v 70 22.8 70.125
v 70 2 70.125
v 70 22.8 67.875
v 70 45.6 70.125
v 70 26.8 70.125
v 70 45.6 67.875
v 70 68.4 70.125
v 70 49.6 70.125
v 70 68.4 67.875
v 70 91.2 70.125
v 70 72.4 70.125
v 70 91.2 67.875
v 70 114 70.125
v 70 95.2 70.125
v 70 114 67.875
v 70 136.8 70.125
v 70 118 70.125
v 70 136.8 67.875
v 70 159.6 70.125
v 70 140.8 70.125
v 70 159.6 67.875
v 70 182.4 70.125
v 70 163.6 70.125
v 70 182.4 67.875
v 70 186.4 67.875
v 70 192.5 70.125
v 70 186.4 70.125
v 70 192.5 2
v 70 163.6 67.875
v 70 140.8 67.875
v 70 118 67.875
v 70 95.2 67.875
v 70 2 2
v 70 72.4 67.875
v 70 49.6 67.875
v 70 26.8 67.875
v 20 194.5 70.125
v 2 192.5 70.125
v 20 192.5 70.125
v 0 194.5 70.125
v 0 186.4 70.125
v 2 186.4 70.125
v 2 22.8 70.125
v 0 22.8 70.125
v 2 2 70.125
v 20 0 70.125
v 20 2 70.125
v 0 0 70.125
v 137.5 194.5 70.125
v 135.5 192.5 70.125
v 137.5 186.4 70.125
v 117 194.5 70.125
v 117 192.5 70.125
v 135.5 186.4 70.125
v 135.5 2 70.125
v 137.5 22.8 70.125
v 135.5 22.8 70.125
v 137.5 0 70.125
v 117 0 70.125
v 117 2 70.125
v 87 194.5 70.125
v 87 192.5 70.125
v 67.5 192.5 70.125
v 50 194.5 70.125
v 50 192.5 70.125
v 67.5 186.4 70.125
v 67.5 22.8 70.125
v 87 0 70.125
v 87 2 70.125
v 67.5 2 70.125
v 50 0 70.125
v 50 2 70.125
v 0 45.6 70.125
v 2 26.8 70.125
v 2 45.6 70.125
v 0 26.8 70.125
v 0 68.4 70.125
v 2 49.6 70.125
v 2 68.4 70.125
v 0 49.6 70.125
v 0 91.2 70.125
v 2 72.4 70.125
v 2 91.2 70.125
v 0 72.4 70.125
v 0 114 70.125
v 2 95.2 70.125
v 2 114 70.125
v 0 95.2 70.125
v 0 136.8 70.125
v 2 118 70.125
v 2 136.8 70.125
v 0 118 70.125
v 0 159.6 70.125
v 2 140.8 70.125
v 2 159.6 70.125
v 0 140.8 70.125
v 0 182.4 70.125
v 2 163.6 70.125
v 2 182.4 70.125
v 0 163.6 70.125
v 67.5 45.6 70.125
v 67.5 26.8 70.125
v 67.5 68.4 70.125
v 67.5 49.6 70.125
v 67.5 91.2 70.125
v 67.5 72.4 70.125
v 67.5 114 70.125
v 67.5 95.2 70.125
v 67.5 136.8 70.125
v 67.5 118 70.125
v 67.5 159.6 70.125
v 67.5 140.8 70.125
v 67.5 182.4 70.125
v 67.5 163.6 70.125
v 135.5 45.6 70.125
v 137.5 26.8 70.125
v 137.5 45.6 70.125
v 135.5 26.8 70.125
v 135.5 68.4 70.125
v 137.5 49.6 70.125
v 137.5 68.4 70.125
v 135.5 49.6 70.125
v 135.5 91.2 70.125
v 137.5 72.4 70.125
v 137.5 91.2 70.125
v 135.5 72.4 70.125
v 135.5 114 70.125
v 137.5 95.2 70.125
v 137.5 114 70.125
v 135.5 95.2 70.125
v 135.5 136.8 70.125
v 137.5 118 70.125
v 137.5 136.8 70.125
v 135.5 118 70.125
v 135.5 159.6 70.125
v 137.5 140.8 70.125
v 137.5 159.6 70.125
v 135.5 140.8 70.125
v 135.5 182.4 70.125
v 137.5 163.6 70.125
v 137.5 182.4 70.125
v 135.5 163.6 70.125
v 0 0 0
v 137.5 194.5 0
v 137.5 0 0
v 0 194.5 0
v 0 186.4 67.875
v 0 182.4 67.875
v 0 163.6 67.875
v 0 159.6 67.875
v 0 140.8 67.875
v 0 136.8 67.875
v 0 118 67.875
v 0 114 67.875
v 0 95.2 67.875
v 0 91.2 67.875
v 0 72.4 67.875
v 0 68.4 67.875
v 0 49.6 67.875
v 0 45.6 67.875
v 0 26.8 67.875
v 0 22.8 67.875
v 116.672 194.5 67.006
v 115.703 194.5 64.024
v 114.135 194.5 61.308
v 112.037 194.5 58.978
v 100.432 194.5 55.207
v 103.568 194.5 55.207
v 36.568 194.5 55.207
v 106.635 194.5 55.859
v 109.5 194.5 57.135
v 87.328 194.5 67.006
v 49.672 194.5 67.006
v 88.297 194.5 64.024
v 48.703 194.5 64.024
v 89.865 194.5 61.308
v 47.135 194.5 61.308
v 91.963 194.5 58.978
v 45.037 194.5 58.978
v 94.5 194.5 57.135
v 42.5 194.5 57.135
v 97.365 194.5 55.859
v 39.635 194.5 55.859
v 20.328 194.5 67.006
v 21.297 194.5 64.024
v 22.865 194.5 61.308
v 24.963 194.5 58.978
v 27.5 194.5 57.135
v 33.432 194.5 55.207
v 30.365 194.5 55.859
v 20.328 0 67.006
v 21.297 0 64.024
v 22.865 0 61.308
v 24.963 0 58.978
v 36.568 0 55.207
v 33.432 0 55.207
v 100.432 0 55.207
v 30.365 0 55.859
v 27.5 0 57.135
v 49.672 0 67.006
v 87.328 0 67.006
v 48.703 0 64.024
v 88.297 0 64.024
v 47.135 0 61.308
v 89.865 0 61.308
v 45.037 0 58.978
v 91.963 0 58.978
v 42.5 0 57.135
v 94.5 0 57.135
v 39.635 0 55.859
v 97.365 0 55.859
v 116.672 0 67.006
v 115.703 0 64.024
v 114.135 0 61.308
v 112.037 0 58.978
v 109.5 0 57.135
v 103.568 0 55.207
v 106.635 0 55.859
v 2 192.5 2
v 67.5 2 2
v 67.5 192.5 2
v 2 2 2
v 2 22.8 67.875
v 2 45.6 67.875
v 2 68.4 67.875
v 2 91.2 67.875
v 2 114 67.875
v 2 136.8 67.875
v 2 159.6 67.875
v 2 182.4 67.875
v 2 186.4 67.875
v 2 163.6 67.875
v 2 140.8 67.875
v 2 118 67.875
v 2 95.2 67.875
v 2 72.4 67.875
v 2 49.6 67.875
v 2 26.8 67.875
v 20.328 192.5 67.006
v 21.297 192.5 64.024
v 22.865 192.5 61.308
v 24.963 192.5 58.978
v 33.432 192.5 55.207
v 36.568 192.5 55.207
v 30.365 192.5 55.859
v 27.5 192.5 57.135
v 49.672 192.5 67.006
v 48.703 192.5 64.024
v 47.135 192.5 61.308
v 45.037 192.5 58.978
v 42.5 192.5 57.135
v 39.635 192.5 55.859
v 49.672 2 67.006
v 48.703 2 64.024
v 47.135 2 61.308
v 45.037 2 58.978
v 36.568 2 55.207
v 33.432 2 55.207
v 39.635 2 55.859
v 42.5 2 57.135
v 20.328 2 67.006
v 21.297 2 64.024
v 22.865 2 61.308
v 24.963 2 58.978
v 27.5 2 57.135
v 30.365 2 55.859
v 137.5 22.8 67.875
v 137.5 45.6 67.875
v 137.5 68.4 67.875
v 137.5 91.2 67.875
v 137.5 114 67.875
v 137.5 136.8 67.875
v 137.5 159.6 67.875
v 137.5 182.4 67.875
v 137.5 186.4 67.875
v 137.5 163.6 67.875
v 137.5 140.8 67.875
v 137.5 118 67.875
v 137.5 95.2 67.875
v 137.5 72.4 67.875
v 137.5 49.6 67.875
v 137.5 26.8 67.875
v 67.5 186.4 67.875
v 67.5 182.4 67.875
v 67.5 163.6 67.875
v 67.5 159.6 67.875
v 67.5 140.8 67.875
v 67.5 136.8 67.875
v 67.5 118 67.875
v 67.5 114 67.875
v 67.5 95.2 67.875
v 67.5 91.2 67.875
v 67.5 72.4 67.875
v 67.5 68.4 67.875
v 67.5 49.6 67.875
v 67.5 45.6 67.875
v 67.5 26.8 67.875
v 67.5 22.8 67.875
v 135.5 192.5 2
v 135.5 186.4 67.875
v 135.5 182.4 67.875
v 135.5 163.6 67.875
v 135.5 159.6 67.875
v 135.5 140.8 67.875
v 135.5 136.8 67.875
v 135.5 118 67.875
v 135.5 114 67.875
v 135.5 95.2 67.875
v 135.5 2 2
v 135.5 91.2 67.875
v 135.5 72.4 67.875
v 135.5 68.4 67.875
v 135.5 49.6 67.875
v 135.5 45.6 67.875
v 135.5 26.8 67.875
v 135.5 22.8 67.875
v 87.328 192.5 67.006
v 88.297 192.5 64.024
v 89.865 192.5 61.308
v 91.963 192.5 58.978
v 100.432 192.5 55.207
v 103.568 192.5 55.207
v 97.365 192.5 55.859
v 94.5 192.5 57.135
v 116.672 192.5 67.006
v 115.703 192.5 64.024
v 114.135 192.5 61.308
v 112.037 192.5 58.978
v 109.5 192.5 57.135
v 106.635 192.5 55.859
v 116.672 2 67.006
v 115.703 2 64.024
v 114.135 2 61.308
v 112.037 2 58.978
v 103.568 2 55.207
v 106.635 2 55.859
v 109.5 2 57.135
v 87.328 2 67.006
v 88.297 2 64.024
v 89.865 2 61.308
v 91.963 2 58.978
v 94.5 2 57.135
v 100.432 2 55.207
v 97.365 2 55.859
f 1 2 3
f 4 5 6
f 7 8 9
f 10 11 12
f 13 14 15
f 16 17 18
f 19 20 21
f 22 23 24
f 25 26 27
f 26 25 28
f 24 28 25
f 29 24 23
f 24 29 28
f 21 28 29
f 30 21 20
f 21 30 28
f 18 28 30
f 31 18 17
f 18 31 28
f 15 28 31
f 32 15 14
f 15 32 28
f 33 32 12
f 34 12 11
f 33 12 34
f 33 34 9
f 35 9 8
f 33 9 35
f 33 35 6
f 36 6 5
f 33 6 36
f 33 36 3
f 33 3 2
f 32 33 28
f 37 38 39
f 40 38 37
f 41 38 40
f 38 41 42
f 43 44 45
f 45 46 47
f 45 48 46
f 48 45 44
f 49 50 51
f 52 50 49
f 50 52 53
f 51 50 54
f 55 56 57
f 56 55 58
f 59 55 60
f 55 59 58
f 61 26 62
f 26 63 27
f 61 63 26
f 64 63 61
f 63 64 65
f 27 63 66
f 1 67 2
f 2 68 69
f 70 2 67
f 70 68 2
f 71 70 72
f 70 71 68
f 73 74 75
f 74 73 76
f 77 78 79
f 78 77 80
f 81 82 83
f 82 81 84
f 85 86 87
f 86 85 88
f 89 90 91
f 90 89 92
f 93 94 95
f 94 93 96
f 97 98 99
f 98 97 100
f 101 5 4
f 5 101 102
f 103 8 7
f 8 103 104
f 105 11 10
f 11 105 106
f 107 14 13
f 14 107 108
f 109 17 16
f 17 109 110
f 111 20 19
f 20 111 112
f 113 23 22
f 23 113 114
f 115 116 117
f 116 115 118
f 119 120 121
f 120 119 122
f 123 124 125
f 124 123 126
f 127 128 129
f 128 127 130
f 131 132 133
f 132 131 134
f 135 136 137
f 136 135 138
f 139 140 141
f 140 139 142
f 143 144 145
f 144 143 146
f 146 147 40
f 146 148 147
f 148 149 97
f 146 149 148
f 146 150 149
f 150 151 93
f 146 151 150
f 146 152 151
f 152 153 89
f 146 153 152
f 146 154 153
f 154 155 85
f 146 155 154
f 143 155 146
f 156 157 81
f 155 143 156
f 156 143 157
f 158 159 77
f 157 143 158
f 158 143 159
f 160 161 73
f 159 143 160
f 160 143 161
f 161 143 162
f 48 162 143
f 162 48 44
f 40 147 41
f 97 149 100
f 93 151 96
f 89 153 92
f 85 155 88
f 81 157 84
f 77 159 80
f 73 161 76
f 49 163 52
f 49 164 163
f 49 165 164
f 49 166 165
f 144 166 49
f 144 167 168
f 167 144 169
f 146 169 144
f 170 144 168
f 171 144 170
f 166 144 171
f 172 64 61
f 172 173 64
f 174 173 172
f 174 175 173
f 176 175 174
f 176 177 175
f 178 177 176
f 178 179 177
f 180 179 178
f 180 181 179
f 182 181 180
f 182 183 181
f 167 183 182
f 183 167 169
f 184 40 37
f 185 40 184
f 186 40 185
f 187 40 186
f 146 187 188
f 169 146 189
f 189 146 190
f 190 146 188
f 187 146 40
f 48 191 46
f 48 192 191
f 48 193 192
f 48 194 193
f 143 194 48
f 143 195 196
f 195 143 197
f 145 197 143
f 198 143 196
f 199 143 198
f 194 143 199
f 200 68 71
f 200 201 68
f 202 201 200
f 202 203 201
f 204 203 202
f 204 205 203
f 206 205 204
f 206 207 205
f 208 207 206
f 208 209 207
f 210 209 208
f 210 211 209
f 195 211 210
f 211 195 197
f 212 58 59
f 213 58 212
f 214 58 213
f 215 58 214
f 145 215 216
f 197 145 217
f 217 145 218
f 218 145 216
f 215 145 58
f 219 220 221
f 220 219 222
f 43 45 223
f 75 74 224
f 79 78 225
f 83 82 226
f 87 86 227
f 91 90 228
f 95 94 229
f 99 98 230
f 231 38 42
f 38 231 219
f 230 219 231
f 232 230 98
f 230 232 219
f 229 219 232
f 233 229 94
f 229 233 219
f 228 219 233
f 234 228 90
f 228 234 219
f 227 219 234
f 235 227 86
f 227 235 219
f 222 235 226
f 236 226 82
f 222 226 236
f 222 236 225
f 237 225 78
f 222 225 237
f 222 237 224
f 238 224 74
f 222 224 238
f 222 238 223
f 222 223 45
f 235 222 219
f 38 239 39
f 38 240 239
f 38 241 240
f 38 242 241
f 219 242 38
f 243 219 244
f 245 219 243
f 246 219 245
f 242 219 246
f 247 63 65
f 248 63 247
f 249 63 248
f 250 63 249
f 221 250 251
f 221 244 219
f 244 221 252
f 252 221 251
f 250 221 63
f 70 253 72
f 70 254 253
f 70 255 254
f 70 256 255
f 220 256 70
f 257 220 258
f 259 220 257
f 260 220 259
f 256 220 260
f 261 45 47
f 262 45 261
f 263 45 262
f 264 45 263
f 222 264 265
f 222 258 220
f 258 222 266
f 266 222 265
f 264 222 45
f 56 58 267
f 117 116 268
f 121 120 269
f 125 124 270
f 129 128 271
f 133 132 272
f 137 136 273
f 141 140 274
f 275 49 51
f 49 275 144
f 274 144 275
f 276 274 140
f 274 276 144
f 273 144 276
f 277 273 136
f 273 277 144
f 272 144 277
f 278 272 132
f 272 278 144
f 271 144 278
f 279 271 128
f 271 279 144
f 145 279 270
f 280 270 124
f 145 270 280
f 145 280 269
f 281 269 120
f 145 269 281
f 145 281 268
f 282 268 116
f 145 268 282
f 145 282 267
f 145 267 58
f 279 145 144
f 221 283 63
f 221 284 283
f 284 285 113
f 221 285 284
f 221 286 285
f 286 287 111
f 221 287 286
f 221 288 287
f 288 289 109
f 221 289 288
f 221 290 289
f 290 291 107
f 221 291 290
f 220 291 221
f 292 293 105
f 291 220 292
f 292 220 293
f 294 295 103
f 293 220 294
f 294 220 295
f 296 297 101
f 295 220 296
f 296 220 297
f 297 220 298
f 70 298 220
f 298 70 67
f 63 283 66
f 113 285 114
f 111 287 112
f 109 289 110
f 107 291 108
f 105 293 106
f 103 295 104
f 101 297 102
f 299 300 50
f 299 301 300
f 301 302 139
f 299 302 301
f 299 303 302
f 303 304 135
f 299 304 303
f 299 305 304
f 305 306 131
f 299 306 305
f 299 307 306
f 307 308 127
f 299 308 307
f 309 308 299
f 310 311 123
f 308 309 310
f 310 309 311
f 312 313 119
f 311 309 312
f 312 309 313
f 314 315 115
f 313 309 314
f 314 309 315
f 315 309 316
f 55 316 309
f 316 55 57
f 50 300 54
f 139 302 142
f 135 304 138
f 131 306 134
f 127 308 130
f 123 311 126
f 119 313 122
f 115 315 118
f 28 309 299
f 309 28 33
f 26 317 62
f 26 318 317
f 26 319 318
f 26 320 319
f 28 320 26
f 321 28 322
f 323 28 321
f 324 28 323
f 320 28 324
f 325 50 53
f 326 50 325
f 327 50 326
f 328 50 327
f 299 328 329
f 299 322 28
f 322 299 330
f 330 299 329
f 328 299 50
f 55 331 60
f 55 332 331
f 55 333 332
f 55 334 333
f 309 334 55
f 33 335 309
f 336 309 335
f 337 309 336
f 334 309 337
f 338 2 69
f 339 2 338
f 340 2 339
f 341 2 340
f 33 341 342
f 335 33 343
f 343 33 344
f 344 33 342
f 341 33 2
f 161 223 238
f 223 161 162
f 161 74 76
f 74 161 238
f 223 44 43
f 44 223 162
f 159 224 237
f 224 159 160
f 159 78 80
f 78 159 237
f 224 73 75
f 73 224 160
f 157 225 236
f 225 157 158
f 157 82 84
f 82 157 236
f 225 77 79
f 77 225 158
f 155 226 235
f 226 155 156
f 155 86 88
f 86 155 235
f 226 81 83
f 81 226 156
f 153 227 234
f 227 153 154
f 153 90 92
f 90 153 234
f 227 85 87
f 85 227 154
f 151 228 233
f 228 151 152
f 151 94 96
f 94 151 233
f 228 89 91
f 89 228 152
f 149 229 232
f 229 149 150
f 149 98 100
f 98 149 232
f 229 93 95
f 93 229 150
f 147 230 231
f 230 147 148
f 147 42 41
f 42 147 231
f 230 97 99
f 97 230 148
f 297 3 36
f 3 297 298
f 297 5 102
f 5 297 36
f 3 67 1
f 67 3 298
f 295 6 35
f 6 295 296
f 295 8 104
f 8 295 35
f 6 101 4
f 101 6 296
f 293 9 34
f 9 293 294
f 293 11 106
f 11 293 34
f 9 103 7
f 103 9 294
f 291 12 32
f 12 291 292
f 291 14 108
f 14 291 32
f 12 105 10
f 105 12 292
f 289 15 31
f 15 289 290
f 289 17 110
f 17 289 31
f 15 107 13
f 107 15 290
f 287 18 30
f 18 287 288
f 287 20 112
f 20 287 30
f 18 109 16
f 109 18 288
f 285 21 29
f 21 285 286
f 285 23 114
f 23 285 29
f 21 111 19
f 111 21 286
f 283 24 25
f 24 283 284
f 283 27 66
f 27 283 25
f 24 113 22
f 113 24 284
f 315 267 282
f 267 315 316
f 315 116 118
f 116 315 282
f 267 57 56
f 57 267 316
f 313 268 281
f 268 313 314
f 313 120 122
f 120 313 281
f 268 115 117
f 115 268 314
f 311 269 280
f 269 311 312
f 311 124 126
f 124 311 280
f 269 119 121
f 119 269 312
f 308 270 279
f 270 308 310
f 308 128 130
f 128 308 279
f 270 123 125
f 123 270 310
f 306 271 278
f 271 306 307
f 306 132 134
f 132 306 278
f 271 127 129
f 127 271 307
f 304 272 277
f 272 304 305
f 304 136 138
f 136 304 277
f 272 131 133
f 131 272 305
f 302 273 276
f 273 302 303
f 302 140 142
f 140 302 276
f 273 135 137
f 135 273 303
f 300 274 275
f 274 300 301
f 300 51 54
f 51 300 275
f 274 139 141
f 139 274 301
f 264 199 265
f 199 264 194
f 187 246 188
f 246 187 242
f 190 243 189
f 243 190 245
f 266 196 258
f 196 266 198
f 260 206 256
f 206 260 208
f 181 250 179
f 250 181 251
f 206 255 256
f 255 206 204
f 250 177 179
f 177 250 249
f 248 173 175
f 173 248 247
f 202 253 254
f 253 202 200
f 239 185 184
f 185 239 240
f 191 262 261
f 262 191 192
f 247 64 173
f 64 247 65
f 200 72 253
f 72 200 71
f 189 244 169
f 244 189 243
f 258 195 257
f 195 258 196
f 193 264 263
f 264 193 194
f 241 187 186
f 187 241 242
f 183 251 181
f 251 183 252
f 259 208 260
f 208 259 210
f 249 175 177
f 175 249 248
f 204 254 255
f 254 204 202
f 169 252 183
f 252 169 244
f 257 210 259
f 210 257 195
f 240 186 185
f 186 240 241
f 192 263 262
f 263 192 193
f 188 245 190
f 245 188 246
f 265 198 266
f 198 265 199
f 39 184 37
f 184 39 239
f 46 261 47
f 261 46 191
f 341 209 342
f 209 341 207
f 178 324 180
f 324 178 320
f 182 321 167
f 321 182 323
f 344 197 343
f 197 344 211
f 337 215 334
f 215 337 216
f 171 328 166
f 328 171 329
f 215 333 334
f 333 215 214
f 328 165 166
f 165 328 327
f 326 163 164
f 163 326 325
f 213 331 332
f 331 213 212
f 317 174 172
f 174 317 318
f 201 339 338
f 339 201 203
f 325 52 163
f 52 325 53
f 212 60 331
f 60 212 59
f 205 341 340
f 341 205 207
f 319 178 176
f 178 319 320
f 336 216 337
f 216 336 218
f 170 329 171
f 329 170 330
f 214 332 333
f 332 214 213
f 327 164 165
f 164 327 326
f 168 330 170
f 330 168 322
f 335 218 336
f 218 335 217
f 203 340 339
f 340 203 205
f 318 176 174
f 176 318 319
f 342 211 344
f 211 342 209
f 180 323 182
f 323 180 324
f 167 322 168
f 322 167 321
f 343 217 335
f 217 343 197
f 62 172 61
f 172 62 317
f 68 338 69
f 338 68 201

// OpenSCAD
cardWidth=65.5;
cardHeight=90.5;
cardThickness=0.38;

boxHeight = cardHeight*0.75;

cardPerBox=500;
cardBlockLength=cardThickness*cardPerBox;

spaceAroundCard=0.25;
spaceAroundLid=0.5;

wallthickness=2;

fingerCutout=30;

// 1 for base box, 0 for lid, 2 for Logo only
boxOrLidOrLogo=1;

// logo filename
//logoFile=""; //No Logo


// logoFile="Pokemon_Card_Sets_Logos/pokemon-unbroken-bonds-set-symbol-150x150.dxf"; //Unbroken Bonds	2019
// logoFile="Pokemon_Card_Sets_Logos/detective-pikachu-set-symbol-150x147.dxf"; //Detective Pikachu	2019
// logoFile="Pokemon_Card_Sets_Logos/pokemon-team-up-set-symbol-150x150.dxf"; //Team Up	2019
// logoFile="Pokemon_Card_Sets_Logos/sm-lost-thunder-set-symbol-145x150.dxf"; //Lost Thunder	2018
// logoFile="Pokemon_Card_Sets_Logos/dragon-majesty-pokemon-set-symbol-150x150.dxf"; //Dragon Majesty	2018
// logoFile="Pokemon_Card_Sets_Logos/sun-and-moon-celestial-storm-pokemon-set-symbol-150x150.dxf"; //Celestial Storm	2018
// logoFile="Pokemon_Card_Sets_Logos/sun-and-moon-forbidden-light-pokemon-set-symbol-150x150.dxf"; //Forbidden Light	2018
// logoFile="Pokemon_Card_Sets_Logos/sun-and-moon-ultra-prism-pokemon-set-symbol-1-150x150.dxf"; //Ultra Prism	2018
// logoFile="Pokemon_Card_Sets_Logos/sun-and-moon-crimson-invasion-pokemon-set-symbol-150x150.dxf"; //Crimson Invasion	2017
// logoFile="Pokemon_Card_Sets_Logos/shining-legends-pokemon-set-symbol-150x150.dxf"; //Shining Legends	2017
// logoFile="Pokemon_Card_Sets_Logos/sun-and-moon-burning-shadows-set-symbol-150x150.dxf"; //Burning Shadows	2017
// logoFile="Pokemon_Card_Sets_Logos/sun-and-moon-guardians-rising-pokemon-set-symbol-150x150.dxf"; //Guardians Rising	2017
// logoFile="Pokemon_Card_Sets_Logos/sun-and-moon-pokemon-set-symbol-150x150.dxf"; //Sun & Moon	2017
// logoFile="Pokemon_Card_Sets_Logos/xy-promos-pokemon-set-symbol-150x136.dxf"; //Sun & Moon Promos	2016
// logoFile="Pokemon_Card_Sets_Logos/xy-evolutions-pokemon-set-symbol-150x150.dxf"; //Evolutions	2016
// logoFile="Pokemon_Card_Sets_Logos/xy-steam-siege-pokemon-set-symbol-150x150.dxf"; //Steam Siege	2016
// logoFile="Pokemon_Card_Sets_Logos/xy-fates-collide-pokemon-set-symbol-150x150.dxf"; //Fates Collide	2016
// logoFile="Pokemon_Card_Sets_Logos/generations-pokemon-set-symbol-150x150.dxf"; //Generations	2016
// logoFile="Pokemon_Card_Sets_Logos/xy-BREAKpoint-pokemon-set-symbol-150x150.dxf"; //BREAKpoint	2016
// logoFile="Pokemon_Card_Sets_Logos/xy-BREAKthrough-pokemon-set-symbol-150x150.dxf"; //BREAKthrough	2015
// logoFile="Pokemon_Card_Sets_Logos/xy-ancient-origins-pokemon-set-symbol-150x150.dxf"; //Ancient Origins	2015
// logoFile="Pokemon_Card_Sets_Logos/xy-roaring-skies-pokemon-set-symbol-150x150.dxf"; //Roaring Skies	2015
// logoFile="Pokemon_Card_Sets_Logos/xy-double-crisis-pokemon-set-symbol.png-150x150.dxf"; //Double Crisis	2015
// logoFile="Pokemon_Card_Sets_Logos/xy-primal-clash-pokemon-set-symbol-150x150.dxf"; //Primal Clash	2015
// logoFile="Pokemon_Card_Sets_Logos/xy-phantom-forces-pokemon-set-symbol-150x150.dxf"; //Phantom Forces	2014
// logoFile="Pokemon_Card_Sets_Logos/xy-furious-fists-pokemon-set-symbol-150x150.dxf"; //Furious Fists	2014
// logoFile="Pokemon_Card_Sets_Logos/xy-flashfire-pokemon-set-symbol-150x150.dxf"; //Flashfire	2014
// logoFile="Pokemon_Card_Sets_Logos/xy-pokemon-set-symbol-150x150.dxf"; //XY	2014
// logoFile="Pokemon_Card_Sets_Logos/xy-kalos-starter-pokemon-set-symbol-150x150.dxf"; //Kalos Starter Set	2013
// logoFile="Pokemon_Card_Sets_Logos/xy-promos-pokemon-set-symbol-150x136.dxf"; //XY - Promos	2013
// logoFile="Pokemon_Card_Sets_Logos/black-and-white-legendary-treasures-pokemon-set-symbol-150x150.dxf"; //Legendary Treasures	2013
// logoFile="Pokemon_Card_Sets_Logos/black-and-white-plasma-blast-pokemon-set-symbol-150x150.dxf"; //Plasma Blast	2013
// logoFile="Pokemon_Card_Sets_Logos/black-and-white-plasma-freeze-pokemon-set-symbol-150x150.dxf"; //Plasma Freeze	2013
// logoFile="Pokemon_Card_Sets_Logos/black-and-white-plasma-storm-pokemon-set-symbol-150x150.dxf"; //Plasma Storm	2013
// logoFile="Pokemon_Card_Sets_Logos/black-and-white-boundaries-crossed-pokemon-set-symbol-150x150.dxf"; //Boundaries Crossed	2012
// logoFile="Pokemon_Card_Sets_Logos/black-and-white-dragon-vault-pokemon-set-symbol-150x150.dxf"; //Dragon Vault	2012
// logoFile="Pokemon_Card_Sets_Logos/black-and-white-dragons-exalted-pokemon-set-symbol-150x150.dxf"; //Dragons Exalted	2012
// logoFile="Pokemon_Card_Sets_Logos/black-and-white-dark-explorers-pokemon-set-symbol-150x150.dxf"; //Dark Explorers	2012
// logoFile="Pokemon_Card_Sets_Logos/black-and-white-next-destinies-pokemon-set-symbol-150x150.dxf"; //Next Destinies	2012
// logoFile="Pokemon_Card_Sets_Logos/black-and-white-noble-victories-pokemon-set-symbol-150x150.dxf"; //Noble Victories	2011
// logoFile="Pokemon_Card_Sets_Logos/black-and-white-emerging-powers-pokemon-set-symbol-150x150.dxf"; //Emerging Powers	2011
// logoFile="Pokemon_Card_Sets_Logos/black-and-white-pokemon-set-symbol-150x150.dxf"; //Black and White Base Set	2011
// logoFile="Pokemon_Card_Sets_Logos/call-of-legends-pokemon-set-symbol-150x150.dxf"; //Call of Legends	2011
// logoFile="Pokemon_Card_Sets_Logos/heartgold-and-soulsilver-triumphant-pokemon-set-symbol-150x150.dxf"; //Triumphant	2010
// logoFile="Pokemon_Card_Sets_Logos/heartgold-and-soulsilver-undaunted-pokemon-set-symbol-150x150.dxf"; //Undaunted	2010
// logoFile="Pokemon_Card_Sets_Logos/heartgold-and-soulsilver-unleashed-pokemon-set-symbol-150x150.dxf"; //Unleashed	2010
// logoFile="Pokemon_Card_Sets_Logos/heartGold-and-soulSilver-pokemon-set-symbol-150x150.dxf"; //HeartGold and SoulSilver	2010
// logoFile="Pokemon_Card_Sets_Logos/heartgold-soulsilver-promos-pokemon-set-symbol-150x136.dxf"; //HeartGold and SoulSilver Promos	2010
// logoFile="Pokemon_Card_Sets_Logos/arceus-pokemon-set-symbol-150x150.dxf"; //Arceus	2009
// logoFile="Pokemon_Card_Sets_Logos/supreme-victors-pokemon-set-symbol-150x150.dxf"; //Supreme Victors	2009
// logoFile="Pokemon_Card_Sets_Logos/rising-rivals-pokemon-set-symbol-150x150.dxf"; //Rising Rivals	2009
// logoFile="Pokemon_Card_Sets_Logos/pokemon-pop-series-9-set-symbol-150x92.dxf"; //POP Series 9	2009
// logoFile="Pokemon_Card_Sets_Logos/platinum-base-set-pokemon-set-symbol-150x150.dxf"; //Platinum Base Set	2009
// logoFile="Pokemon_Card_Sets_Logos/pokemon-pop-series-8-set-symbol-150x91.dxf"; //POP Series 8	2008 - 2009
// logoFile="Pokemon_Card_Sets_Logos/stormfront-pokemon-set-symbol-150x150.dxf"; //Stormfront	2008
// logoFile="Pokemon_Card_Sets_Logos/legends-awakened-pokemon-set-symbol-150x150.dxf"; //Legends Awakened	2008
// logoFile="Pokemon_Card_Sets_Logos/majestic-dawn-pokemon-set-symbol-150x150.dxf"; //Majestic Dawn	2008
// logoFile="Pokemon_Card_Sets_Logos/pokemon-pop-series-7-set-symbol-150x95.dxf"; //POP Series 7	2008
// logoFile="Pokemon_Card_Sets_Logos/great-encounters-pokemon-set-symbol-150x150.dxf"; //Great Encounters	2008	
// logoFile="Pokemon_Card_Sets_Logos/secret-wonders-pokemon-set-symbol-150x150.dxf"; //Secret Wonders	2007
// logoFile="Pokemon_Card_Sets_Logos/pokemon-pop-series-6-set-symbol-150x91.dxf"; //POP Series 6	2007 - 2008
// logoFile="Pokemon_Card_Sets_Logos/mysterious-treasures-pokemon-set-symbol-150x150.dxf"; //Mysterious Treasures	2007
// logoFile="Pokemon_Card_Sets_Logos/diamond-and-pearl-pokemon-set-symbol-150x150.dxf"; //Diamond & Pearl	2007
// logoFile="Pokemon_Card_Sets_Logos/diamond-pearl-promos-pokemon-set-symbol-150x136.dxf"; //Diamond & Pearl Promos	2007
// logoFile="Pokemon_Card_Sets_Logos/pokemon-pop-series-5-set-symbol-150x97.dxf"; //POP Series 5	2007
// logoFile="Pokemon_Card_Sets_Logos/ex-power-keepers-pokemon-set-symbol-150x150.dxf"; //Power Keepers	2007
// logoFile="Pokemon_Card_Sets_Logos/ex-dragon-frontiers-pokemon-set-symbol-150x150.dxf"; //Dragon Frontiers	2006
// logoFile="Pokemon_Card_Sets_Logos/ex-crystal-guardians-pokemon-set-symbol-150x150.dxf"; //Crystal Guardians	2006
// logoFile="Pokemon_Card_Sets_Logos/pokemon-pop-series-4-set-symbol-150x92.dxf"; //POP Series 4	2006 - 2007
// logoFile="Pokemon_Card_Sets_Logos/ex-holon-phantoms-pokemon-set-symbol-150x150.dxf"; //Holon Phantoms	2006
// logoFile="Pokemon_Card_Sets_Logos/pokemon-pop-series-3-set-symbol-150x94.dxf"; //POP Series 3	2006
// logoFile="Pokemon_Card_Sets_Logos/ex-trainer-kit-2-minun-pokemon-set-symbol-115x150.dxf"; //EX Trainer Kit 2	2006
// logoFile="Pokemon_Card_Sets_Logos/ex-legend-maker-pokemon-set-symbol-150x150.dxf"; //Legend Maker	2006
// logoFile="Pokemon_Card_Sets_Logos/ex-delta-species-pokemon-set-symbol-150x150.dxf"; //Delta Species	2005
// logoFile="Pokemon_Card_Sets_Logos/ex-unseen-forces-pokemon-set-symbol-150x150.dxf"; //Unseen Forces	2005
// logoFile="Pokemon_Card_Sets_Logos/pokemon-pop-series-2-set-symbol-150x94.dxf"; //POP Series 2	2005 - 2006
// logoFile="Pokemon_Card_Sets_Logos/ex-emerald-pokemon-set-symbol-150x150.dxf"; //Emerald	2005
// logoFile="Pokemon_Card_Sets_Logos/ex-deoxys-pokemon-set-symbol-150x150.dxf"; //Deoxys	2005
// logoFile="Pokemon_Card_Sets_Logos/ex-team-rocket-returns-pokemon-set-symbol.dxf"; //Team Rocket Returns	2004
// logoFile="Pokemon_Card_Sets_Logos/pokemon-pop-series-1-set-symbol-150x100.dxf"; //POP Series 1	2004 - 2005
// logoFile="Pokemon_Card_Sets_Logos/ex-fire-red-and-leaf-green-pokemon-set-symbol.dxf"; //Fire Red and Leaf Green	2004
// logoFile="Pokemon_Card_Sets_Logos/ex-hidden-legends-pokemon-set-symbol.dxf"; //Hidden Legends	2004
// logoFile="Pokemon_Card_Sets_Logos/pokemon-ex-trainer-kit-latias-set-symbol-150x101.dxf"; //EX Trainer Kit	2004
// logoFile="Pokemon_Card_Sets_Logos/ex-team-magma-vs-team-aqua-pokemon-set-symbol.dxf"; //Team Magma vs Team Aqua	2004
// logoFile="Pokemon_Card_Sets_Logos/ex-dragon-pokemon-set-symbol.dxf"; //Dragon	2003
// logoFile="Pokemon_Card_Sets_Logos/ex-sandstorm-pokemon-set-symbol.dxf"; //Sandstorm	2003
// logoFile="Pokemon_Card_Sets_Logos/ex-ruby-and-sapphire-pokemon-set-symbol.dxf"; //Ruby and Sapphire	2003
// logoFile="Pokemon_Card_Sets_Logos/skyridge-pokemon-set-symbol.dxf"; //Skyridge	2003
// logoFile="Pokemon_Card_Sets_Logos/pokemon-nintendo-black-star-promos-set-symbol-150x136.dxf"; //Nintendo Black Star Promos	2003 - 2006
// logoFile="Pokemon_Card_Sets_Logos/aquapolis-pokemon-set-symbol.dxf"; //Aquapolis	2003
// logoFile="Pokemon_Card_Sets_Logos/expedition-base-set-pokemon-set-symbol.dxf"; //Expedition	2002
// logoFile="Pokemon_Card_Sets_Logos/legendary-collection-pokemon-set-symbol.dxf"; //Legendary Collection	2002
// logoFile="Pokemon_Card_Sets_Logos/neo-destiny-pokemon-set-symbol.dxf"; //Neo Destiny	2002
// logoFile="Pokemon_Card_Sets_Logos/neo-revelation-pokemon-set-symbol-150x97.dxf"; //Neo Revelation	2001
// logoFile="Pokemon_Card_Sets_Logos/pokemon-southern-islands-set-symbol-150x118.dxf"; //Southern Islands	2001
// logoFile="Pokemon_Card_Sets_Logos/neo-discovery-pokemon-set-symbol.dxf"; //Neo Discovery	2001
// logoFile="Pokemon_Card_Sets_Logos/neo-genesis-pokemon-set-symbol.dxf"; //Neo Genesis	2000
// logoFile="Pokemon_Card_Sets_Logos/gym-challenge-pokemon-set-symbol-150x92.dxf"; //Gym Challenge	2000
// logoFile="Pokemon_Card_Sets_Logos/gym-heroes-pokemon-set-symbol-150x91.dxf"; //Gym Heroes	2000
// logoFile="Pokemon_Card_Sets_Logos/team-rocket-pokemon-set-symbol.dxf"; //Team Rocket	2000
// logoFile="Pokemon_Card_Sets_Logos/base-set-2-pokemon-set-symbol.dxf"; //Base Set 2	2000
// logoFile="Pokemon_Card_Sets_Logos/fossil-pokemon-set-symbol.dxf"; //Fossil	1999
 logoFile="Pokemon_Card_Sets_Logos/pokemon-wizards-black-star-promos-set-symbol-150x136.dxf"; //Wizards Black Star Promos	1999 - 2003
// logoFile="Pokemon_Card_Sets_Logos/jungle-pokemon-set-symbol.dxf"; //Jungle	1999
//logoFile="Pokemon_Card_Sets_Logos/.dxf"; //Base Set	1999
// logoFile="Pokemon_Card_Sets_Logos/mcdonalds-pokemon-2018-set-symbol-150x140.dxf"; //McDonald’s 2018	2018
// logoFile="Pokemon_Card_Sets_Logos/mcdonalds-pokemon-2017-set-symbol-150x150.dxf"; //McDonald’s 2017	2017
// logoFile="Pokemon_Card_Sets_Logos/mcdonalds-pokemon-2016-set-symbol-150x140.dxf"; //McDonald’s 2016	2016
// logoFile="Pokemon_Card_Sets_Logos/mcdonalds-pokemon-2015-set-symbol-148x150.dxf"; //McDonald’s 2015	2015
// logoFile="Pokemon_Card_Sets_Logos/mcdonalds-pokemon-2014-set-symbol-150x148.dxf"; //McDonald’s 2014	2014
// logoFile="Pokemon_Card_Sets_Logos/mcdonalds-pokemon-2013-set-symbol.dxf"; //McDonald’s 2013	2013
// logoFile="Pokemon_Card_Sets_Logos/mcdonalds-pokemon-2012-set-symbol-150x150.dxf"; //McDonald’s 2012	2012
// logoFile="Pokemon_Card_Sets_Logos/mcdonalds-pokemon-2011-set-symbol-150x130.dxf"; //McDonald’s 2011	2011


if (boxOrLidOrLogo==0) {
   mainLid();
}
if (boxOrLidOrLogo==1) {
   mainBox();
}
if (boxOrLidOrLogo==2) {
   Logo();
}

module mainBox () {
    difference() {
        Box();
        translate([
            (cardWidth+(spaceAroundCard*2)+(wallthickness*2))/2,
            cardBlockLength+(spaceAroundCard*2)+(wallthickness*3),
            boxHeight+spaceAroundCard+wallthickness
            ]){
            rotate(a=[90,0,0]){
                cylinder(h=(cardBlockLength+(spaceAroundCard*2)+(wallthickness*4)),d=fingerCutout);
            }
        }
        translate([
            (cardWidth+(spaceAroundCard*2)+(wallthickness))*(3/2),
            cardBlockLength+(spaceAroundCard*2)+(wallthickness*3),
            boxHeight+spaceAroundCard+wallthickness
            ]){
            rotate(a=[90,0,0]){
                cylinder(h=(cardBlockLength+(spaceAroundCard*2)+(wallthickness*4)),d=fingerCutout);
            }
        }
        Notches();
    }
    
}


module Box () {
    difference() {
        cube([
        cardWidth+(spaceAroundCard*2)+(wallthickness*2),
        cardBlockLength+(spaceAroundCard*2)+(wallthickness*2),
        boxHeight+spaceAroundCard+wallthickness
        ]);
        translate([wallthickness,wallthickness,wallthickness]) {
            cube([
            cardWidth+(spaceAroundCard*2),
            cardBlockLength+(spaceAroundCard*2),
            boxHeight+spaceAroundCard+wallthickness
            ]);
        }
    }
    translate([cardWidth+wallthickness,0,0]) {
    difference() {
        cube([
        cardWidth+(spaceAroundCard*2)+(wallthickness*2),
        cardBlockLength+(spaceAroundCard*2)+(wallthickness*2),
        boxHeight+spaceAroundCard+wallthickness
        ]);
        translate([wallthickness,wallthickness,wallthickness]) {
            cube([
            cardWidth+(spaceAroundCard*2),
            cardBlockLength+(spaceAroundCard*2),
            boxHeight+spaceAroundCard+wallthickness
            ]);
        }
    }
    }
}

module mainLid () {
    difference() {
        LidBox();
        translate([
            -spaceAroundLid,
            (cardBlockLength+(spaceAroundCard*2)+(wallthickness*4)+(spaceAroundLid*2))/2,
            boxHeight+spaceAroundCard+(wallthickness*2)+(spaceAroundLid)
            ]){
            rotate(a=[0,90,0]){
                cylinder(h=cardWidth*2+(spaceAroundCard*2)+(wallthickness*5)+(spaceAroundLid*4),d=fingerCutout);
            }
        }
        if (logoFile) Logo();
    }
}


module LidBox () {
    difference() {
        cube([
        cardWidth*2+(spaceAroundCard*2)+(wallthickness*5)+(spaceAroundLid*2),
        cardBlockLength+(spaceAroundCard*2)+(wallthickness*4)+(spaceAroundLid*2),
        boxHeight+spaceAroundCard+(wallthickness*2)+(spaceAroundLid)
        ]);
        translate([wallthickness,wallthickness,wallthickness]) {
            cube([
            cardWidth*2+(spaceAroundCard*2)+(wallthickness*3)+(spaceAroundLid*2),
            cardBlockLength+(spaceAroundCard*2)+(wallthickness*2)+(spaceAroundLid*2),
            boxHeight+spaceAroundCard+(wallthickness*2)+(spaceAroundLid)
            ]);
        }
    }
}

module Logo () {
        
    boxwidth=cardWidth*2+(spaceAroundCard*2)+(wallthickness*5)+(spaceAroundLid*2);
    logoSize = boxwidth/2;
    translate([((boxwidth/2)/2)+(boxwidth/2),wallthickness/2,boxwidth/1.5]) {
        rotate(a=[90,180,0]){
            resize([logoSize,logoSize,wallthickness/2]) {
                linear_extrude(height = 4) import(logoFile);
            }
        }
    }   
}

module Notches() {
    cardCount = 60;
    distanceBetweenNotches = cardThickness * cardCount;
    notchCount = cardBlockLength / distanceBetweenNotches;
    notchSize = 2;

    for (i = [0:2]){
        for (j = [1:notchCount]){
            translate([(cardWidth+(wallthickness))*i-1,distanceBetweenNotches*j,boxHeight ]){
                cube(wallthickness+2,1,1);
            }
        }
    }
}
